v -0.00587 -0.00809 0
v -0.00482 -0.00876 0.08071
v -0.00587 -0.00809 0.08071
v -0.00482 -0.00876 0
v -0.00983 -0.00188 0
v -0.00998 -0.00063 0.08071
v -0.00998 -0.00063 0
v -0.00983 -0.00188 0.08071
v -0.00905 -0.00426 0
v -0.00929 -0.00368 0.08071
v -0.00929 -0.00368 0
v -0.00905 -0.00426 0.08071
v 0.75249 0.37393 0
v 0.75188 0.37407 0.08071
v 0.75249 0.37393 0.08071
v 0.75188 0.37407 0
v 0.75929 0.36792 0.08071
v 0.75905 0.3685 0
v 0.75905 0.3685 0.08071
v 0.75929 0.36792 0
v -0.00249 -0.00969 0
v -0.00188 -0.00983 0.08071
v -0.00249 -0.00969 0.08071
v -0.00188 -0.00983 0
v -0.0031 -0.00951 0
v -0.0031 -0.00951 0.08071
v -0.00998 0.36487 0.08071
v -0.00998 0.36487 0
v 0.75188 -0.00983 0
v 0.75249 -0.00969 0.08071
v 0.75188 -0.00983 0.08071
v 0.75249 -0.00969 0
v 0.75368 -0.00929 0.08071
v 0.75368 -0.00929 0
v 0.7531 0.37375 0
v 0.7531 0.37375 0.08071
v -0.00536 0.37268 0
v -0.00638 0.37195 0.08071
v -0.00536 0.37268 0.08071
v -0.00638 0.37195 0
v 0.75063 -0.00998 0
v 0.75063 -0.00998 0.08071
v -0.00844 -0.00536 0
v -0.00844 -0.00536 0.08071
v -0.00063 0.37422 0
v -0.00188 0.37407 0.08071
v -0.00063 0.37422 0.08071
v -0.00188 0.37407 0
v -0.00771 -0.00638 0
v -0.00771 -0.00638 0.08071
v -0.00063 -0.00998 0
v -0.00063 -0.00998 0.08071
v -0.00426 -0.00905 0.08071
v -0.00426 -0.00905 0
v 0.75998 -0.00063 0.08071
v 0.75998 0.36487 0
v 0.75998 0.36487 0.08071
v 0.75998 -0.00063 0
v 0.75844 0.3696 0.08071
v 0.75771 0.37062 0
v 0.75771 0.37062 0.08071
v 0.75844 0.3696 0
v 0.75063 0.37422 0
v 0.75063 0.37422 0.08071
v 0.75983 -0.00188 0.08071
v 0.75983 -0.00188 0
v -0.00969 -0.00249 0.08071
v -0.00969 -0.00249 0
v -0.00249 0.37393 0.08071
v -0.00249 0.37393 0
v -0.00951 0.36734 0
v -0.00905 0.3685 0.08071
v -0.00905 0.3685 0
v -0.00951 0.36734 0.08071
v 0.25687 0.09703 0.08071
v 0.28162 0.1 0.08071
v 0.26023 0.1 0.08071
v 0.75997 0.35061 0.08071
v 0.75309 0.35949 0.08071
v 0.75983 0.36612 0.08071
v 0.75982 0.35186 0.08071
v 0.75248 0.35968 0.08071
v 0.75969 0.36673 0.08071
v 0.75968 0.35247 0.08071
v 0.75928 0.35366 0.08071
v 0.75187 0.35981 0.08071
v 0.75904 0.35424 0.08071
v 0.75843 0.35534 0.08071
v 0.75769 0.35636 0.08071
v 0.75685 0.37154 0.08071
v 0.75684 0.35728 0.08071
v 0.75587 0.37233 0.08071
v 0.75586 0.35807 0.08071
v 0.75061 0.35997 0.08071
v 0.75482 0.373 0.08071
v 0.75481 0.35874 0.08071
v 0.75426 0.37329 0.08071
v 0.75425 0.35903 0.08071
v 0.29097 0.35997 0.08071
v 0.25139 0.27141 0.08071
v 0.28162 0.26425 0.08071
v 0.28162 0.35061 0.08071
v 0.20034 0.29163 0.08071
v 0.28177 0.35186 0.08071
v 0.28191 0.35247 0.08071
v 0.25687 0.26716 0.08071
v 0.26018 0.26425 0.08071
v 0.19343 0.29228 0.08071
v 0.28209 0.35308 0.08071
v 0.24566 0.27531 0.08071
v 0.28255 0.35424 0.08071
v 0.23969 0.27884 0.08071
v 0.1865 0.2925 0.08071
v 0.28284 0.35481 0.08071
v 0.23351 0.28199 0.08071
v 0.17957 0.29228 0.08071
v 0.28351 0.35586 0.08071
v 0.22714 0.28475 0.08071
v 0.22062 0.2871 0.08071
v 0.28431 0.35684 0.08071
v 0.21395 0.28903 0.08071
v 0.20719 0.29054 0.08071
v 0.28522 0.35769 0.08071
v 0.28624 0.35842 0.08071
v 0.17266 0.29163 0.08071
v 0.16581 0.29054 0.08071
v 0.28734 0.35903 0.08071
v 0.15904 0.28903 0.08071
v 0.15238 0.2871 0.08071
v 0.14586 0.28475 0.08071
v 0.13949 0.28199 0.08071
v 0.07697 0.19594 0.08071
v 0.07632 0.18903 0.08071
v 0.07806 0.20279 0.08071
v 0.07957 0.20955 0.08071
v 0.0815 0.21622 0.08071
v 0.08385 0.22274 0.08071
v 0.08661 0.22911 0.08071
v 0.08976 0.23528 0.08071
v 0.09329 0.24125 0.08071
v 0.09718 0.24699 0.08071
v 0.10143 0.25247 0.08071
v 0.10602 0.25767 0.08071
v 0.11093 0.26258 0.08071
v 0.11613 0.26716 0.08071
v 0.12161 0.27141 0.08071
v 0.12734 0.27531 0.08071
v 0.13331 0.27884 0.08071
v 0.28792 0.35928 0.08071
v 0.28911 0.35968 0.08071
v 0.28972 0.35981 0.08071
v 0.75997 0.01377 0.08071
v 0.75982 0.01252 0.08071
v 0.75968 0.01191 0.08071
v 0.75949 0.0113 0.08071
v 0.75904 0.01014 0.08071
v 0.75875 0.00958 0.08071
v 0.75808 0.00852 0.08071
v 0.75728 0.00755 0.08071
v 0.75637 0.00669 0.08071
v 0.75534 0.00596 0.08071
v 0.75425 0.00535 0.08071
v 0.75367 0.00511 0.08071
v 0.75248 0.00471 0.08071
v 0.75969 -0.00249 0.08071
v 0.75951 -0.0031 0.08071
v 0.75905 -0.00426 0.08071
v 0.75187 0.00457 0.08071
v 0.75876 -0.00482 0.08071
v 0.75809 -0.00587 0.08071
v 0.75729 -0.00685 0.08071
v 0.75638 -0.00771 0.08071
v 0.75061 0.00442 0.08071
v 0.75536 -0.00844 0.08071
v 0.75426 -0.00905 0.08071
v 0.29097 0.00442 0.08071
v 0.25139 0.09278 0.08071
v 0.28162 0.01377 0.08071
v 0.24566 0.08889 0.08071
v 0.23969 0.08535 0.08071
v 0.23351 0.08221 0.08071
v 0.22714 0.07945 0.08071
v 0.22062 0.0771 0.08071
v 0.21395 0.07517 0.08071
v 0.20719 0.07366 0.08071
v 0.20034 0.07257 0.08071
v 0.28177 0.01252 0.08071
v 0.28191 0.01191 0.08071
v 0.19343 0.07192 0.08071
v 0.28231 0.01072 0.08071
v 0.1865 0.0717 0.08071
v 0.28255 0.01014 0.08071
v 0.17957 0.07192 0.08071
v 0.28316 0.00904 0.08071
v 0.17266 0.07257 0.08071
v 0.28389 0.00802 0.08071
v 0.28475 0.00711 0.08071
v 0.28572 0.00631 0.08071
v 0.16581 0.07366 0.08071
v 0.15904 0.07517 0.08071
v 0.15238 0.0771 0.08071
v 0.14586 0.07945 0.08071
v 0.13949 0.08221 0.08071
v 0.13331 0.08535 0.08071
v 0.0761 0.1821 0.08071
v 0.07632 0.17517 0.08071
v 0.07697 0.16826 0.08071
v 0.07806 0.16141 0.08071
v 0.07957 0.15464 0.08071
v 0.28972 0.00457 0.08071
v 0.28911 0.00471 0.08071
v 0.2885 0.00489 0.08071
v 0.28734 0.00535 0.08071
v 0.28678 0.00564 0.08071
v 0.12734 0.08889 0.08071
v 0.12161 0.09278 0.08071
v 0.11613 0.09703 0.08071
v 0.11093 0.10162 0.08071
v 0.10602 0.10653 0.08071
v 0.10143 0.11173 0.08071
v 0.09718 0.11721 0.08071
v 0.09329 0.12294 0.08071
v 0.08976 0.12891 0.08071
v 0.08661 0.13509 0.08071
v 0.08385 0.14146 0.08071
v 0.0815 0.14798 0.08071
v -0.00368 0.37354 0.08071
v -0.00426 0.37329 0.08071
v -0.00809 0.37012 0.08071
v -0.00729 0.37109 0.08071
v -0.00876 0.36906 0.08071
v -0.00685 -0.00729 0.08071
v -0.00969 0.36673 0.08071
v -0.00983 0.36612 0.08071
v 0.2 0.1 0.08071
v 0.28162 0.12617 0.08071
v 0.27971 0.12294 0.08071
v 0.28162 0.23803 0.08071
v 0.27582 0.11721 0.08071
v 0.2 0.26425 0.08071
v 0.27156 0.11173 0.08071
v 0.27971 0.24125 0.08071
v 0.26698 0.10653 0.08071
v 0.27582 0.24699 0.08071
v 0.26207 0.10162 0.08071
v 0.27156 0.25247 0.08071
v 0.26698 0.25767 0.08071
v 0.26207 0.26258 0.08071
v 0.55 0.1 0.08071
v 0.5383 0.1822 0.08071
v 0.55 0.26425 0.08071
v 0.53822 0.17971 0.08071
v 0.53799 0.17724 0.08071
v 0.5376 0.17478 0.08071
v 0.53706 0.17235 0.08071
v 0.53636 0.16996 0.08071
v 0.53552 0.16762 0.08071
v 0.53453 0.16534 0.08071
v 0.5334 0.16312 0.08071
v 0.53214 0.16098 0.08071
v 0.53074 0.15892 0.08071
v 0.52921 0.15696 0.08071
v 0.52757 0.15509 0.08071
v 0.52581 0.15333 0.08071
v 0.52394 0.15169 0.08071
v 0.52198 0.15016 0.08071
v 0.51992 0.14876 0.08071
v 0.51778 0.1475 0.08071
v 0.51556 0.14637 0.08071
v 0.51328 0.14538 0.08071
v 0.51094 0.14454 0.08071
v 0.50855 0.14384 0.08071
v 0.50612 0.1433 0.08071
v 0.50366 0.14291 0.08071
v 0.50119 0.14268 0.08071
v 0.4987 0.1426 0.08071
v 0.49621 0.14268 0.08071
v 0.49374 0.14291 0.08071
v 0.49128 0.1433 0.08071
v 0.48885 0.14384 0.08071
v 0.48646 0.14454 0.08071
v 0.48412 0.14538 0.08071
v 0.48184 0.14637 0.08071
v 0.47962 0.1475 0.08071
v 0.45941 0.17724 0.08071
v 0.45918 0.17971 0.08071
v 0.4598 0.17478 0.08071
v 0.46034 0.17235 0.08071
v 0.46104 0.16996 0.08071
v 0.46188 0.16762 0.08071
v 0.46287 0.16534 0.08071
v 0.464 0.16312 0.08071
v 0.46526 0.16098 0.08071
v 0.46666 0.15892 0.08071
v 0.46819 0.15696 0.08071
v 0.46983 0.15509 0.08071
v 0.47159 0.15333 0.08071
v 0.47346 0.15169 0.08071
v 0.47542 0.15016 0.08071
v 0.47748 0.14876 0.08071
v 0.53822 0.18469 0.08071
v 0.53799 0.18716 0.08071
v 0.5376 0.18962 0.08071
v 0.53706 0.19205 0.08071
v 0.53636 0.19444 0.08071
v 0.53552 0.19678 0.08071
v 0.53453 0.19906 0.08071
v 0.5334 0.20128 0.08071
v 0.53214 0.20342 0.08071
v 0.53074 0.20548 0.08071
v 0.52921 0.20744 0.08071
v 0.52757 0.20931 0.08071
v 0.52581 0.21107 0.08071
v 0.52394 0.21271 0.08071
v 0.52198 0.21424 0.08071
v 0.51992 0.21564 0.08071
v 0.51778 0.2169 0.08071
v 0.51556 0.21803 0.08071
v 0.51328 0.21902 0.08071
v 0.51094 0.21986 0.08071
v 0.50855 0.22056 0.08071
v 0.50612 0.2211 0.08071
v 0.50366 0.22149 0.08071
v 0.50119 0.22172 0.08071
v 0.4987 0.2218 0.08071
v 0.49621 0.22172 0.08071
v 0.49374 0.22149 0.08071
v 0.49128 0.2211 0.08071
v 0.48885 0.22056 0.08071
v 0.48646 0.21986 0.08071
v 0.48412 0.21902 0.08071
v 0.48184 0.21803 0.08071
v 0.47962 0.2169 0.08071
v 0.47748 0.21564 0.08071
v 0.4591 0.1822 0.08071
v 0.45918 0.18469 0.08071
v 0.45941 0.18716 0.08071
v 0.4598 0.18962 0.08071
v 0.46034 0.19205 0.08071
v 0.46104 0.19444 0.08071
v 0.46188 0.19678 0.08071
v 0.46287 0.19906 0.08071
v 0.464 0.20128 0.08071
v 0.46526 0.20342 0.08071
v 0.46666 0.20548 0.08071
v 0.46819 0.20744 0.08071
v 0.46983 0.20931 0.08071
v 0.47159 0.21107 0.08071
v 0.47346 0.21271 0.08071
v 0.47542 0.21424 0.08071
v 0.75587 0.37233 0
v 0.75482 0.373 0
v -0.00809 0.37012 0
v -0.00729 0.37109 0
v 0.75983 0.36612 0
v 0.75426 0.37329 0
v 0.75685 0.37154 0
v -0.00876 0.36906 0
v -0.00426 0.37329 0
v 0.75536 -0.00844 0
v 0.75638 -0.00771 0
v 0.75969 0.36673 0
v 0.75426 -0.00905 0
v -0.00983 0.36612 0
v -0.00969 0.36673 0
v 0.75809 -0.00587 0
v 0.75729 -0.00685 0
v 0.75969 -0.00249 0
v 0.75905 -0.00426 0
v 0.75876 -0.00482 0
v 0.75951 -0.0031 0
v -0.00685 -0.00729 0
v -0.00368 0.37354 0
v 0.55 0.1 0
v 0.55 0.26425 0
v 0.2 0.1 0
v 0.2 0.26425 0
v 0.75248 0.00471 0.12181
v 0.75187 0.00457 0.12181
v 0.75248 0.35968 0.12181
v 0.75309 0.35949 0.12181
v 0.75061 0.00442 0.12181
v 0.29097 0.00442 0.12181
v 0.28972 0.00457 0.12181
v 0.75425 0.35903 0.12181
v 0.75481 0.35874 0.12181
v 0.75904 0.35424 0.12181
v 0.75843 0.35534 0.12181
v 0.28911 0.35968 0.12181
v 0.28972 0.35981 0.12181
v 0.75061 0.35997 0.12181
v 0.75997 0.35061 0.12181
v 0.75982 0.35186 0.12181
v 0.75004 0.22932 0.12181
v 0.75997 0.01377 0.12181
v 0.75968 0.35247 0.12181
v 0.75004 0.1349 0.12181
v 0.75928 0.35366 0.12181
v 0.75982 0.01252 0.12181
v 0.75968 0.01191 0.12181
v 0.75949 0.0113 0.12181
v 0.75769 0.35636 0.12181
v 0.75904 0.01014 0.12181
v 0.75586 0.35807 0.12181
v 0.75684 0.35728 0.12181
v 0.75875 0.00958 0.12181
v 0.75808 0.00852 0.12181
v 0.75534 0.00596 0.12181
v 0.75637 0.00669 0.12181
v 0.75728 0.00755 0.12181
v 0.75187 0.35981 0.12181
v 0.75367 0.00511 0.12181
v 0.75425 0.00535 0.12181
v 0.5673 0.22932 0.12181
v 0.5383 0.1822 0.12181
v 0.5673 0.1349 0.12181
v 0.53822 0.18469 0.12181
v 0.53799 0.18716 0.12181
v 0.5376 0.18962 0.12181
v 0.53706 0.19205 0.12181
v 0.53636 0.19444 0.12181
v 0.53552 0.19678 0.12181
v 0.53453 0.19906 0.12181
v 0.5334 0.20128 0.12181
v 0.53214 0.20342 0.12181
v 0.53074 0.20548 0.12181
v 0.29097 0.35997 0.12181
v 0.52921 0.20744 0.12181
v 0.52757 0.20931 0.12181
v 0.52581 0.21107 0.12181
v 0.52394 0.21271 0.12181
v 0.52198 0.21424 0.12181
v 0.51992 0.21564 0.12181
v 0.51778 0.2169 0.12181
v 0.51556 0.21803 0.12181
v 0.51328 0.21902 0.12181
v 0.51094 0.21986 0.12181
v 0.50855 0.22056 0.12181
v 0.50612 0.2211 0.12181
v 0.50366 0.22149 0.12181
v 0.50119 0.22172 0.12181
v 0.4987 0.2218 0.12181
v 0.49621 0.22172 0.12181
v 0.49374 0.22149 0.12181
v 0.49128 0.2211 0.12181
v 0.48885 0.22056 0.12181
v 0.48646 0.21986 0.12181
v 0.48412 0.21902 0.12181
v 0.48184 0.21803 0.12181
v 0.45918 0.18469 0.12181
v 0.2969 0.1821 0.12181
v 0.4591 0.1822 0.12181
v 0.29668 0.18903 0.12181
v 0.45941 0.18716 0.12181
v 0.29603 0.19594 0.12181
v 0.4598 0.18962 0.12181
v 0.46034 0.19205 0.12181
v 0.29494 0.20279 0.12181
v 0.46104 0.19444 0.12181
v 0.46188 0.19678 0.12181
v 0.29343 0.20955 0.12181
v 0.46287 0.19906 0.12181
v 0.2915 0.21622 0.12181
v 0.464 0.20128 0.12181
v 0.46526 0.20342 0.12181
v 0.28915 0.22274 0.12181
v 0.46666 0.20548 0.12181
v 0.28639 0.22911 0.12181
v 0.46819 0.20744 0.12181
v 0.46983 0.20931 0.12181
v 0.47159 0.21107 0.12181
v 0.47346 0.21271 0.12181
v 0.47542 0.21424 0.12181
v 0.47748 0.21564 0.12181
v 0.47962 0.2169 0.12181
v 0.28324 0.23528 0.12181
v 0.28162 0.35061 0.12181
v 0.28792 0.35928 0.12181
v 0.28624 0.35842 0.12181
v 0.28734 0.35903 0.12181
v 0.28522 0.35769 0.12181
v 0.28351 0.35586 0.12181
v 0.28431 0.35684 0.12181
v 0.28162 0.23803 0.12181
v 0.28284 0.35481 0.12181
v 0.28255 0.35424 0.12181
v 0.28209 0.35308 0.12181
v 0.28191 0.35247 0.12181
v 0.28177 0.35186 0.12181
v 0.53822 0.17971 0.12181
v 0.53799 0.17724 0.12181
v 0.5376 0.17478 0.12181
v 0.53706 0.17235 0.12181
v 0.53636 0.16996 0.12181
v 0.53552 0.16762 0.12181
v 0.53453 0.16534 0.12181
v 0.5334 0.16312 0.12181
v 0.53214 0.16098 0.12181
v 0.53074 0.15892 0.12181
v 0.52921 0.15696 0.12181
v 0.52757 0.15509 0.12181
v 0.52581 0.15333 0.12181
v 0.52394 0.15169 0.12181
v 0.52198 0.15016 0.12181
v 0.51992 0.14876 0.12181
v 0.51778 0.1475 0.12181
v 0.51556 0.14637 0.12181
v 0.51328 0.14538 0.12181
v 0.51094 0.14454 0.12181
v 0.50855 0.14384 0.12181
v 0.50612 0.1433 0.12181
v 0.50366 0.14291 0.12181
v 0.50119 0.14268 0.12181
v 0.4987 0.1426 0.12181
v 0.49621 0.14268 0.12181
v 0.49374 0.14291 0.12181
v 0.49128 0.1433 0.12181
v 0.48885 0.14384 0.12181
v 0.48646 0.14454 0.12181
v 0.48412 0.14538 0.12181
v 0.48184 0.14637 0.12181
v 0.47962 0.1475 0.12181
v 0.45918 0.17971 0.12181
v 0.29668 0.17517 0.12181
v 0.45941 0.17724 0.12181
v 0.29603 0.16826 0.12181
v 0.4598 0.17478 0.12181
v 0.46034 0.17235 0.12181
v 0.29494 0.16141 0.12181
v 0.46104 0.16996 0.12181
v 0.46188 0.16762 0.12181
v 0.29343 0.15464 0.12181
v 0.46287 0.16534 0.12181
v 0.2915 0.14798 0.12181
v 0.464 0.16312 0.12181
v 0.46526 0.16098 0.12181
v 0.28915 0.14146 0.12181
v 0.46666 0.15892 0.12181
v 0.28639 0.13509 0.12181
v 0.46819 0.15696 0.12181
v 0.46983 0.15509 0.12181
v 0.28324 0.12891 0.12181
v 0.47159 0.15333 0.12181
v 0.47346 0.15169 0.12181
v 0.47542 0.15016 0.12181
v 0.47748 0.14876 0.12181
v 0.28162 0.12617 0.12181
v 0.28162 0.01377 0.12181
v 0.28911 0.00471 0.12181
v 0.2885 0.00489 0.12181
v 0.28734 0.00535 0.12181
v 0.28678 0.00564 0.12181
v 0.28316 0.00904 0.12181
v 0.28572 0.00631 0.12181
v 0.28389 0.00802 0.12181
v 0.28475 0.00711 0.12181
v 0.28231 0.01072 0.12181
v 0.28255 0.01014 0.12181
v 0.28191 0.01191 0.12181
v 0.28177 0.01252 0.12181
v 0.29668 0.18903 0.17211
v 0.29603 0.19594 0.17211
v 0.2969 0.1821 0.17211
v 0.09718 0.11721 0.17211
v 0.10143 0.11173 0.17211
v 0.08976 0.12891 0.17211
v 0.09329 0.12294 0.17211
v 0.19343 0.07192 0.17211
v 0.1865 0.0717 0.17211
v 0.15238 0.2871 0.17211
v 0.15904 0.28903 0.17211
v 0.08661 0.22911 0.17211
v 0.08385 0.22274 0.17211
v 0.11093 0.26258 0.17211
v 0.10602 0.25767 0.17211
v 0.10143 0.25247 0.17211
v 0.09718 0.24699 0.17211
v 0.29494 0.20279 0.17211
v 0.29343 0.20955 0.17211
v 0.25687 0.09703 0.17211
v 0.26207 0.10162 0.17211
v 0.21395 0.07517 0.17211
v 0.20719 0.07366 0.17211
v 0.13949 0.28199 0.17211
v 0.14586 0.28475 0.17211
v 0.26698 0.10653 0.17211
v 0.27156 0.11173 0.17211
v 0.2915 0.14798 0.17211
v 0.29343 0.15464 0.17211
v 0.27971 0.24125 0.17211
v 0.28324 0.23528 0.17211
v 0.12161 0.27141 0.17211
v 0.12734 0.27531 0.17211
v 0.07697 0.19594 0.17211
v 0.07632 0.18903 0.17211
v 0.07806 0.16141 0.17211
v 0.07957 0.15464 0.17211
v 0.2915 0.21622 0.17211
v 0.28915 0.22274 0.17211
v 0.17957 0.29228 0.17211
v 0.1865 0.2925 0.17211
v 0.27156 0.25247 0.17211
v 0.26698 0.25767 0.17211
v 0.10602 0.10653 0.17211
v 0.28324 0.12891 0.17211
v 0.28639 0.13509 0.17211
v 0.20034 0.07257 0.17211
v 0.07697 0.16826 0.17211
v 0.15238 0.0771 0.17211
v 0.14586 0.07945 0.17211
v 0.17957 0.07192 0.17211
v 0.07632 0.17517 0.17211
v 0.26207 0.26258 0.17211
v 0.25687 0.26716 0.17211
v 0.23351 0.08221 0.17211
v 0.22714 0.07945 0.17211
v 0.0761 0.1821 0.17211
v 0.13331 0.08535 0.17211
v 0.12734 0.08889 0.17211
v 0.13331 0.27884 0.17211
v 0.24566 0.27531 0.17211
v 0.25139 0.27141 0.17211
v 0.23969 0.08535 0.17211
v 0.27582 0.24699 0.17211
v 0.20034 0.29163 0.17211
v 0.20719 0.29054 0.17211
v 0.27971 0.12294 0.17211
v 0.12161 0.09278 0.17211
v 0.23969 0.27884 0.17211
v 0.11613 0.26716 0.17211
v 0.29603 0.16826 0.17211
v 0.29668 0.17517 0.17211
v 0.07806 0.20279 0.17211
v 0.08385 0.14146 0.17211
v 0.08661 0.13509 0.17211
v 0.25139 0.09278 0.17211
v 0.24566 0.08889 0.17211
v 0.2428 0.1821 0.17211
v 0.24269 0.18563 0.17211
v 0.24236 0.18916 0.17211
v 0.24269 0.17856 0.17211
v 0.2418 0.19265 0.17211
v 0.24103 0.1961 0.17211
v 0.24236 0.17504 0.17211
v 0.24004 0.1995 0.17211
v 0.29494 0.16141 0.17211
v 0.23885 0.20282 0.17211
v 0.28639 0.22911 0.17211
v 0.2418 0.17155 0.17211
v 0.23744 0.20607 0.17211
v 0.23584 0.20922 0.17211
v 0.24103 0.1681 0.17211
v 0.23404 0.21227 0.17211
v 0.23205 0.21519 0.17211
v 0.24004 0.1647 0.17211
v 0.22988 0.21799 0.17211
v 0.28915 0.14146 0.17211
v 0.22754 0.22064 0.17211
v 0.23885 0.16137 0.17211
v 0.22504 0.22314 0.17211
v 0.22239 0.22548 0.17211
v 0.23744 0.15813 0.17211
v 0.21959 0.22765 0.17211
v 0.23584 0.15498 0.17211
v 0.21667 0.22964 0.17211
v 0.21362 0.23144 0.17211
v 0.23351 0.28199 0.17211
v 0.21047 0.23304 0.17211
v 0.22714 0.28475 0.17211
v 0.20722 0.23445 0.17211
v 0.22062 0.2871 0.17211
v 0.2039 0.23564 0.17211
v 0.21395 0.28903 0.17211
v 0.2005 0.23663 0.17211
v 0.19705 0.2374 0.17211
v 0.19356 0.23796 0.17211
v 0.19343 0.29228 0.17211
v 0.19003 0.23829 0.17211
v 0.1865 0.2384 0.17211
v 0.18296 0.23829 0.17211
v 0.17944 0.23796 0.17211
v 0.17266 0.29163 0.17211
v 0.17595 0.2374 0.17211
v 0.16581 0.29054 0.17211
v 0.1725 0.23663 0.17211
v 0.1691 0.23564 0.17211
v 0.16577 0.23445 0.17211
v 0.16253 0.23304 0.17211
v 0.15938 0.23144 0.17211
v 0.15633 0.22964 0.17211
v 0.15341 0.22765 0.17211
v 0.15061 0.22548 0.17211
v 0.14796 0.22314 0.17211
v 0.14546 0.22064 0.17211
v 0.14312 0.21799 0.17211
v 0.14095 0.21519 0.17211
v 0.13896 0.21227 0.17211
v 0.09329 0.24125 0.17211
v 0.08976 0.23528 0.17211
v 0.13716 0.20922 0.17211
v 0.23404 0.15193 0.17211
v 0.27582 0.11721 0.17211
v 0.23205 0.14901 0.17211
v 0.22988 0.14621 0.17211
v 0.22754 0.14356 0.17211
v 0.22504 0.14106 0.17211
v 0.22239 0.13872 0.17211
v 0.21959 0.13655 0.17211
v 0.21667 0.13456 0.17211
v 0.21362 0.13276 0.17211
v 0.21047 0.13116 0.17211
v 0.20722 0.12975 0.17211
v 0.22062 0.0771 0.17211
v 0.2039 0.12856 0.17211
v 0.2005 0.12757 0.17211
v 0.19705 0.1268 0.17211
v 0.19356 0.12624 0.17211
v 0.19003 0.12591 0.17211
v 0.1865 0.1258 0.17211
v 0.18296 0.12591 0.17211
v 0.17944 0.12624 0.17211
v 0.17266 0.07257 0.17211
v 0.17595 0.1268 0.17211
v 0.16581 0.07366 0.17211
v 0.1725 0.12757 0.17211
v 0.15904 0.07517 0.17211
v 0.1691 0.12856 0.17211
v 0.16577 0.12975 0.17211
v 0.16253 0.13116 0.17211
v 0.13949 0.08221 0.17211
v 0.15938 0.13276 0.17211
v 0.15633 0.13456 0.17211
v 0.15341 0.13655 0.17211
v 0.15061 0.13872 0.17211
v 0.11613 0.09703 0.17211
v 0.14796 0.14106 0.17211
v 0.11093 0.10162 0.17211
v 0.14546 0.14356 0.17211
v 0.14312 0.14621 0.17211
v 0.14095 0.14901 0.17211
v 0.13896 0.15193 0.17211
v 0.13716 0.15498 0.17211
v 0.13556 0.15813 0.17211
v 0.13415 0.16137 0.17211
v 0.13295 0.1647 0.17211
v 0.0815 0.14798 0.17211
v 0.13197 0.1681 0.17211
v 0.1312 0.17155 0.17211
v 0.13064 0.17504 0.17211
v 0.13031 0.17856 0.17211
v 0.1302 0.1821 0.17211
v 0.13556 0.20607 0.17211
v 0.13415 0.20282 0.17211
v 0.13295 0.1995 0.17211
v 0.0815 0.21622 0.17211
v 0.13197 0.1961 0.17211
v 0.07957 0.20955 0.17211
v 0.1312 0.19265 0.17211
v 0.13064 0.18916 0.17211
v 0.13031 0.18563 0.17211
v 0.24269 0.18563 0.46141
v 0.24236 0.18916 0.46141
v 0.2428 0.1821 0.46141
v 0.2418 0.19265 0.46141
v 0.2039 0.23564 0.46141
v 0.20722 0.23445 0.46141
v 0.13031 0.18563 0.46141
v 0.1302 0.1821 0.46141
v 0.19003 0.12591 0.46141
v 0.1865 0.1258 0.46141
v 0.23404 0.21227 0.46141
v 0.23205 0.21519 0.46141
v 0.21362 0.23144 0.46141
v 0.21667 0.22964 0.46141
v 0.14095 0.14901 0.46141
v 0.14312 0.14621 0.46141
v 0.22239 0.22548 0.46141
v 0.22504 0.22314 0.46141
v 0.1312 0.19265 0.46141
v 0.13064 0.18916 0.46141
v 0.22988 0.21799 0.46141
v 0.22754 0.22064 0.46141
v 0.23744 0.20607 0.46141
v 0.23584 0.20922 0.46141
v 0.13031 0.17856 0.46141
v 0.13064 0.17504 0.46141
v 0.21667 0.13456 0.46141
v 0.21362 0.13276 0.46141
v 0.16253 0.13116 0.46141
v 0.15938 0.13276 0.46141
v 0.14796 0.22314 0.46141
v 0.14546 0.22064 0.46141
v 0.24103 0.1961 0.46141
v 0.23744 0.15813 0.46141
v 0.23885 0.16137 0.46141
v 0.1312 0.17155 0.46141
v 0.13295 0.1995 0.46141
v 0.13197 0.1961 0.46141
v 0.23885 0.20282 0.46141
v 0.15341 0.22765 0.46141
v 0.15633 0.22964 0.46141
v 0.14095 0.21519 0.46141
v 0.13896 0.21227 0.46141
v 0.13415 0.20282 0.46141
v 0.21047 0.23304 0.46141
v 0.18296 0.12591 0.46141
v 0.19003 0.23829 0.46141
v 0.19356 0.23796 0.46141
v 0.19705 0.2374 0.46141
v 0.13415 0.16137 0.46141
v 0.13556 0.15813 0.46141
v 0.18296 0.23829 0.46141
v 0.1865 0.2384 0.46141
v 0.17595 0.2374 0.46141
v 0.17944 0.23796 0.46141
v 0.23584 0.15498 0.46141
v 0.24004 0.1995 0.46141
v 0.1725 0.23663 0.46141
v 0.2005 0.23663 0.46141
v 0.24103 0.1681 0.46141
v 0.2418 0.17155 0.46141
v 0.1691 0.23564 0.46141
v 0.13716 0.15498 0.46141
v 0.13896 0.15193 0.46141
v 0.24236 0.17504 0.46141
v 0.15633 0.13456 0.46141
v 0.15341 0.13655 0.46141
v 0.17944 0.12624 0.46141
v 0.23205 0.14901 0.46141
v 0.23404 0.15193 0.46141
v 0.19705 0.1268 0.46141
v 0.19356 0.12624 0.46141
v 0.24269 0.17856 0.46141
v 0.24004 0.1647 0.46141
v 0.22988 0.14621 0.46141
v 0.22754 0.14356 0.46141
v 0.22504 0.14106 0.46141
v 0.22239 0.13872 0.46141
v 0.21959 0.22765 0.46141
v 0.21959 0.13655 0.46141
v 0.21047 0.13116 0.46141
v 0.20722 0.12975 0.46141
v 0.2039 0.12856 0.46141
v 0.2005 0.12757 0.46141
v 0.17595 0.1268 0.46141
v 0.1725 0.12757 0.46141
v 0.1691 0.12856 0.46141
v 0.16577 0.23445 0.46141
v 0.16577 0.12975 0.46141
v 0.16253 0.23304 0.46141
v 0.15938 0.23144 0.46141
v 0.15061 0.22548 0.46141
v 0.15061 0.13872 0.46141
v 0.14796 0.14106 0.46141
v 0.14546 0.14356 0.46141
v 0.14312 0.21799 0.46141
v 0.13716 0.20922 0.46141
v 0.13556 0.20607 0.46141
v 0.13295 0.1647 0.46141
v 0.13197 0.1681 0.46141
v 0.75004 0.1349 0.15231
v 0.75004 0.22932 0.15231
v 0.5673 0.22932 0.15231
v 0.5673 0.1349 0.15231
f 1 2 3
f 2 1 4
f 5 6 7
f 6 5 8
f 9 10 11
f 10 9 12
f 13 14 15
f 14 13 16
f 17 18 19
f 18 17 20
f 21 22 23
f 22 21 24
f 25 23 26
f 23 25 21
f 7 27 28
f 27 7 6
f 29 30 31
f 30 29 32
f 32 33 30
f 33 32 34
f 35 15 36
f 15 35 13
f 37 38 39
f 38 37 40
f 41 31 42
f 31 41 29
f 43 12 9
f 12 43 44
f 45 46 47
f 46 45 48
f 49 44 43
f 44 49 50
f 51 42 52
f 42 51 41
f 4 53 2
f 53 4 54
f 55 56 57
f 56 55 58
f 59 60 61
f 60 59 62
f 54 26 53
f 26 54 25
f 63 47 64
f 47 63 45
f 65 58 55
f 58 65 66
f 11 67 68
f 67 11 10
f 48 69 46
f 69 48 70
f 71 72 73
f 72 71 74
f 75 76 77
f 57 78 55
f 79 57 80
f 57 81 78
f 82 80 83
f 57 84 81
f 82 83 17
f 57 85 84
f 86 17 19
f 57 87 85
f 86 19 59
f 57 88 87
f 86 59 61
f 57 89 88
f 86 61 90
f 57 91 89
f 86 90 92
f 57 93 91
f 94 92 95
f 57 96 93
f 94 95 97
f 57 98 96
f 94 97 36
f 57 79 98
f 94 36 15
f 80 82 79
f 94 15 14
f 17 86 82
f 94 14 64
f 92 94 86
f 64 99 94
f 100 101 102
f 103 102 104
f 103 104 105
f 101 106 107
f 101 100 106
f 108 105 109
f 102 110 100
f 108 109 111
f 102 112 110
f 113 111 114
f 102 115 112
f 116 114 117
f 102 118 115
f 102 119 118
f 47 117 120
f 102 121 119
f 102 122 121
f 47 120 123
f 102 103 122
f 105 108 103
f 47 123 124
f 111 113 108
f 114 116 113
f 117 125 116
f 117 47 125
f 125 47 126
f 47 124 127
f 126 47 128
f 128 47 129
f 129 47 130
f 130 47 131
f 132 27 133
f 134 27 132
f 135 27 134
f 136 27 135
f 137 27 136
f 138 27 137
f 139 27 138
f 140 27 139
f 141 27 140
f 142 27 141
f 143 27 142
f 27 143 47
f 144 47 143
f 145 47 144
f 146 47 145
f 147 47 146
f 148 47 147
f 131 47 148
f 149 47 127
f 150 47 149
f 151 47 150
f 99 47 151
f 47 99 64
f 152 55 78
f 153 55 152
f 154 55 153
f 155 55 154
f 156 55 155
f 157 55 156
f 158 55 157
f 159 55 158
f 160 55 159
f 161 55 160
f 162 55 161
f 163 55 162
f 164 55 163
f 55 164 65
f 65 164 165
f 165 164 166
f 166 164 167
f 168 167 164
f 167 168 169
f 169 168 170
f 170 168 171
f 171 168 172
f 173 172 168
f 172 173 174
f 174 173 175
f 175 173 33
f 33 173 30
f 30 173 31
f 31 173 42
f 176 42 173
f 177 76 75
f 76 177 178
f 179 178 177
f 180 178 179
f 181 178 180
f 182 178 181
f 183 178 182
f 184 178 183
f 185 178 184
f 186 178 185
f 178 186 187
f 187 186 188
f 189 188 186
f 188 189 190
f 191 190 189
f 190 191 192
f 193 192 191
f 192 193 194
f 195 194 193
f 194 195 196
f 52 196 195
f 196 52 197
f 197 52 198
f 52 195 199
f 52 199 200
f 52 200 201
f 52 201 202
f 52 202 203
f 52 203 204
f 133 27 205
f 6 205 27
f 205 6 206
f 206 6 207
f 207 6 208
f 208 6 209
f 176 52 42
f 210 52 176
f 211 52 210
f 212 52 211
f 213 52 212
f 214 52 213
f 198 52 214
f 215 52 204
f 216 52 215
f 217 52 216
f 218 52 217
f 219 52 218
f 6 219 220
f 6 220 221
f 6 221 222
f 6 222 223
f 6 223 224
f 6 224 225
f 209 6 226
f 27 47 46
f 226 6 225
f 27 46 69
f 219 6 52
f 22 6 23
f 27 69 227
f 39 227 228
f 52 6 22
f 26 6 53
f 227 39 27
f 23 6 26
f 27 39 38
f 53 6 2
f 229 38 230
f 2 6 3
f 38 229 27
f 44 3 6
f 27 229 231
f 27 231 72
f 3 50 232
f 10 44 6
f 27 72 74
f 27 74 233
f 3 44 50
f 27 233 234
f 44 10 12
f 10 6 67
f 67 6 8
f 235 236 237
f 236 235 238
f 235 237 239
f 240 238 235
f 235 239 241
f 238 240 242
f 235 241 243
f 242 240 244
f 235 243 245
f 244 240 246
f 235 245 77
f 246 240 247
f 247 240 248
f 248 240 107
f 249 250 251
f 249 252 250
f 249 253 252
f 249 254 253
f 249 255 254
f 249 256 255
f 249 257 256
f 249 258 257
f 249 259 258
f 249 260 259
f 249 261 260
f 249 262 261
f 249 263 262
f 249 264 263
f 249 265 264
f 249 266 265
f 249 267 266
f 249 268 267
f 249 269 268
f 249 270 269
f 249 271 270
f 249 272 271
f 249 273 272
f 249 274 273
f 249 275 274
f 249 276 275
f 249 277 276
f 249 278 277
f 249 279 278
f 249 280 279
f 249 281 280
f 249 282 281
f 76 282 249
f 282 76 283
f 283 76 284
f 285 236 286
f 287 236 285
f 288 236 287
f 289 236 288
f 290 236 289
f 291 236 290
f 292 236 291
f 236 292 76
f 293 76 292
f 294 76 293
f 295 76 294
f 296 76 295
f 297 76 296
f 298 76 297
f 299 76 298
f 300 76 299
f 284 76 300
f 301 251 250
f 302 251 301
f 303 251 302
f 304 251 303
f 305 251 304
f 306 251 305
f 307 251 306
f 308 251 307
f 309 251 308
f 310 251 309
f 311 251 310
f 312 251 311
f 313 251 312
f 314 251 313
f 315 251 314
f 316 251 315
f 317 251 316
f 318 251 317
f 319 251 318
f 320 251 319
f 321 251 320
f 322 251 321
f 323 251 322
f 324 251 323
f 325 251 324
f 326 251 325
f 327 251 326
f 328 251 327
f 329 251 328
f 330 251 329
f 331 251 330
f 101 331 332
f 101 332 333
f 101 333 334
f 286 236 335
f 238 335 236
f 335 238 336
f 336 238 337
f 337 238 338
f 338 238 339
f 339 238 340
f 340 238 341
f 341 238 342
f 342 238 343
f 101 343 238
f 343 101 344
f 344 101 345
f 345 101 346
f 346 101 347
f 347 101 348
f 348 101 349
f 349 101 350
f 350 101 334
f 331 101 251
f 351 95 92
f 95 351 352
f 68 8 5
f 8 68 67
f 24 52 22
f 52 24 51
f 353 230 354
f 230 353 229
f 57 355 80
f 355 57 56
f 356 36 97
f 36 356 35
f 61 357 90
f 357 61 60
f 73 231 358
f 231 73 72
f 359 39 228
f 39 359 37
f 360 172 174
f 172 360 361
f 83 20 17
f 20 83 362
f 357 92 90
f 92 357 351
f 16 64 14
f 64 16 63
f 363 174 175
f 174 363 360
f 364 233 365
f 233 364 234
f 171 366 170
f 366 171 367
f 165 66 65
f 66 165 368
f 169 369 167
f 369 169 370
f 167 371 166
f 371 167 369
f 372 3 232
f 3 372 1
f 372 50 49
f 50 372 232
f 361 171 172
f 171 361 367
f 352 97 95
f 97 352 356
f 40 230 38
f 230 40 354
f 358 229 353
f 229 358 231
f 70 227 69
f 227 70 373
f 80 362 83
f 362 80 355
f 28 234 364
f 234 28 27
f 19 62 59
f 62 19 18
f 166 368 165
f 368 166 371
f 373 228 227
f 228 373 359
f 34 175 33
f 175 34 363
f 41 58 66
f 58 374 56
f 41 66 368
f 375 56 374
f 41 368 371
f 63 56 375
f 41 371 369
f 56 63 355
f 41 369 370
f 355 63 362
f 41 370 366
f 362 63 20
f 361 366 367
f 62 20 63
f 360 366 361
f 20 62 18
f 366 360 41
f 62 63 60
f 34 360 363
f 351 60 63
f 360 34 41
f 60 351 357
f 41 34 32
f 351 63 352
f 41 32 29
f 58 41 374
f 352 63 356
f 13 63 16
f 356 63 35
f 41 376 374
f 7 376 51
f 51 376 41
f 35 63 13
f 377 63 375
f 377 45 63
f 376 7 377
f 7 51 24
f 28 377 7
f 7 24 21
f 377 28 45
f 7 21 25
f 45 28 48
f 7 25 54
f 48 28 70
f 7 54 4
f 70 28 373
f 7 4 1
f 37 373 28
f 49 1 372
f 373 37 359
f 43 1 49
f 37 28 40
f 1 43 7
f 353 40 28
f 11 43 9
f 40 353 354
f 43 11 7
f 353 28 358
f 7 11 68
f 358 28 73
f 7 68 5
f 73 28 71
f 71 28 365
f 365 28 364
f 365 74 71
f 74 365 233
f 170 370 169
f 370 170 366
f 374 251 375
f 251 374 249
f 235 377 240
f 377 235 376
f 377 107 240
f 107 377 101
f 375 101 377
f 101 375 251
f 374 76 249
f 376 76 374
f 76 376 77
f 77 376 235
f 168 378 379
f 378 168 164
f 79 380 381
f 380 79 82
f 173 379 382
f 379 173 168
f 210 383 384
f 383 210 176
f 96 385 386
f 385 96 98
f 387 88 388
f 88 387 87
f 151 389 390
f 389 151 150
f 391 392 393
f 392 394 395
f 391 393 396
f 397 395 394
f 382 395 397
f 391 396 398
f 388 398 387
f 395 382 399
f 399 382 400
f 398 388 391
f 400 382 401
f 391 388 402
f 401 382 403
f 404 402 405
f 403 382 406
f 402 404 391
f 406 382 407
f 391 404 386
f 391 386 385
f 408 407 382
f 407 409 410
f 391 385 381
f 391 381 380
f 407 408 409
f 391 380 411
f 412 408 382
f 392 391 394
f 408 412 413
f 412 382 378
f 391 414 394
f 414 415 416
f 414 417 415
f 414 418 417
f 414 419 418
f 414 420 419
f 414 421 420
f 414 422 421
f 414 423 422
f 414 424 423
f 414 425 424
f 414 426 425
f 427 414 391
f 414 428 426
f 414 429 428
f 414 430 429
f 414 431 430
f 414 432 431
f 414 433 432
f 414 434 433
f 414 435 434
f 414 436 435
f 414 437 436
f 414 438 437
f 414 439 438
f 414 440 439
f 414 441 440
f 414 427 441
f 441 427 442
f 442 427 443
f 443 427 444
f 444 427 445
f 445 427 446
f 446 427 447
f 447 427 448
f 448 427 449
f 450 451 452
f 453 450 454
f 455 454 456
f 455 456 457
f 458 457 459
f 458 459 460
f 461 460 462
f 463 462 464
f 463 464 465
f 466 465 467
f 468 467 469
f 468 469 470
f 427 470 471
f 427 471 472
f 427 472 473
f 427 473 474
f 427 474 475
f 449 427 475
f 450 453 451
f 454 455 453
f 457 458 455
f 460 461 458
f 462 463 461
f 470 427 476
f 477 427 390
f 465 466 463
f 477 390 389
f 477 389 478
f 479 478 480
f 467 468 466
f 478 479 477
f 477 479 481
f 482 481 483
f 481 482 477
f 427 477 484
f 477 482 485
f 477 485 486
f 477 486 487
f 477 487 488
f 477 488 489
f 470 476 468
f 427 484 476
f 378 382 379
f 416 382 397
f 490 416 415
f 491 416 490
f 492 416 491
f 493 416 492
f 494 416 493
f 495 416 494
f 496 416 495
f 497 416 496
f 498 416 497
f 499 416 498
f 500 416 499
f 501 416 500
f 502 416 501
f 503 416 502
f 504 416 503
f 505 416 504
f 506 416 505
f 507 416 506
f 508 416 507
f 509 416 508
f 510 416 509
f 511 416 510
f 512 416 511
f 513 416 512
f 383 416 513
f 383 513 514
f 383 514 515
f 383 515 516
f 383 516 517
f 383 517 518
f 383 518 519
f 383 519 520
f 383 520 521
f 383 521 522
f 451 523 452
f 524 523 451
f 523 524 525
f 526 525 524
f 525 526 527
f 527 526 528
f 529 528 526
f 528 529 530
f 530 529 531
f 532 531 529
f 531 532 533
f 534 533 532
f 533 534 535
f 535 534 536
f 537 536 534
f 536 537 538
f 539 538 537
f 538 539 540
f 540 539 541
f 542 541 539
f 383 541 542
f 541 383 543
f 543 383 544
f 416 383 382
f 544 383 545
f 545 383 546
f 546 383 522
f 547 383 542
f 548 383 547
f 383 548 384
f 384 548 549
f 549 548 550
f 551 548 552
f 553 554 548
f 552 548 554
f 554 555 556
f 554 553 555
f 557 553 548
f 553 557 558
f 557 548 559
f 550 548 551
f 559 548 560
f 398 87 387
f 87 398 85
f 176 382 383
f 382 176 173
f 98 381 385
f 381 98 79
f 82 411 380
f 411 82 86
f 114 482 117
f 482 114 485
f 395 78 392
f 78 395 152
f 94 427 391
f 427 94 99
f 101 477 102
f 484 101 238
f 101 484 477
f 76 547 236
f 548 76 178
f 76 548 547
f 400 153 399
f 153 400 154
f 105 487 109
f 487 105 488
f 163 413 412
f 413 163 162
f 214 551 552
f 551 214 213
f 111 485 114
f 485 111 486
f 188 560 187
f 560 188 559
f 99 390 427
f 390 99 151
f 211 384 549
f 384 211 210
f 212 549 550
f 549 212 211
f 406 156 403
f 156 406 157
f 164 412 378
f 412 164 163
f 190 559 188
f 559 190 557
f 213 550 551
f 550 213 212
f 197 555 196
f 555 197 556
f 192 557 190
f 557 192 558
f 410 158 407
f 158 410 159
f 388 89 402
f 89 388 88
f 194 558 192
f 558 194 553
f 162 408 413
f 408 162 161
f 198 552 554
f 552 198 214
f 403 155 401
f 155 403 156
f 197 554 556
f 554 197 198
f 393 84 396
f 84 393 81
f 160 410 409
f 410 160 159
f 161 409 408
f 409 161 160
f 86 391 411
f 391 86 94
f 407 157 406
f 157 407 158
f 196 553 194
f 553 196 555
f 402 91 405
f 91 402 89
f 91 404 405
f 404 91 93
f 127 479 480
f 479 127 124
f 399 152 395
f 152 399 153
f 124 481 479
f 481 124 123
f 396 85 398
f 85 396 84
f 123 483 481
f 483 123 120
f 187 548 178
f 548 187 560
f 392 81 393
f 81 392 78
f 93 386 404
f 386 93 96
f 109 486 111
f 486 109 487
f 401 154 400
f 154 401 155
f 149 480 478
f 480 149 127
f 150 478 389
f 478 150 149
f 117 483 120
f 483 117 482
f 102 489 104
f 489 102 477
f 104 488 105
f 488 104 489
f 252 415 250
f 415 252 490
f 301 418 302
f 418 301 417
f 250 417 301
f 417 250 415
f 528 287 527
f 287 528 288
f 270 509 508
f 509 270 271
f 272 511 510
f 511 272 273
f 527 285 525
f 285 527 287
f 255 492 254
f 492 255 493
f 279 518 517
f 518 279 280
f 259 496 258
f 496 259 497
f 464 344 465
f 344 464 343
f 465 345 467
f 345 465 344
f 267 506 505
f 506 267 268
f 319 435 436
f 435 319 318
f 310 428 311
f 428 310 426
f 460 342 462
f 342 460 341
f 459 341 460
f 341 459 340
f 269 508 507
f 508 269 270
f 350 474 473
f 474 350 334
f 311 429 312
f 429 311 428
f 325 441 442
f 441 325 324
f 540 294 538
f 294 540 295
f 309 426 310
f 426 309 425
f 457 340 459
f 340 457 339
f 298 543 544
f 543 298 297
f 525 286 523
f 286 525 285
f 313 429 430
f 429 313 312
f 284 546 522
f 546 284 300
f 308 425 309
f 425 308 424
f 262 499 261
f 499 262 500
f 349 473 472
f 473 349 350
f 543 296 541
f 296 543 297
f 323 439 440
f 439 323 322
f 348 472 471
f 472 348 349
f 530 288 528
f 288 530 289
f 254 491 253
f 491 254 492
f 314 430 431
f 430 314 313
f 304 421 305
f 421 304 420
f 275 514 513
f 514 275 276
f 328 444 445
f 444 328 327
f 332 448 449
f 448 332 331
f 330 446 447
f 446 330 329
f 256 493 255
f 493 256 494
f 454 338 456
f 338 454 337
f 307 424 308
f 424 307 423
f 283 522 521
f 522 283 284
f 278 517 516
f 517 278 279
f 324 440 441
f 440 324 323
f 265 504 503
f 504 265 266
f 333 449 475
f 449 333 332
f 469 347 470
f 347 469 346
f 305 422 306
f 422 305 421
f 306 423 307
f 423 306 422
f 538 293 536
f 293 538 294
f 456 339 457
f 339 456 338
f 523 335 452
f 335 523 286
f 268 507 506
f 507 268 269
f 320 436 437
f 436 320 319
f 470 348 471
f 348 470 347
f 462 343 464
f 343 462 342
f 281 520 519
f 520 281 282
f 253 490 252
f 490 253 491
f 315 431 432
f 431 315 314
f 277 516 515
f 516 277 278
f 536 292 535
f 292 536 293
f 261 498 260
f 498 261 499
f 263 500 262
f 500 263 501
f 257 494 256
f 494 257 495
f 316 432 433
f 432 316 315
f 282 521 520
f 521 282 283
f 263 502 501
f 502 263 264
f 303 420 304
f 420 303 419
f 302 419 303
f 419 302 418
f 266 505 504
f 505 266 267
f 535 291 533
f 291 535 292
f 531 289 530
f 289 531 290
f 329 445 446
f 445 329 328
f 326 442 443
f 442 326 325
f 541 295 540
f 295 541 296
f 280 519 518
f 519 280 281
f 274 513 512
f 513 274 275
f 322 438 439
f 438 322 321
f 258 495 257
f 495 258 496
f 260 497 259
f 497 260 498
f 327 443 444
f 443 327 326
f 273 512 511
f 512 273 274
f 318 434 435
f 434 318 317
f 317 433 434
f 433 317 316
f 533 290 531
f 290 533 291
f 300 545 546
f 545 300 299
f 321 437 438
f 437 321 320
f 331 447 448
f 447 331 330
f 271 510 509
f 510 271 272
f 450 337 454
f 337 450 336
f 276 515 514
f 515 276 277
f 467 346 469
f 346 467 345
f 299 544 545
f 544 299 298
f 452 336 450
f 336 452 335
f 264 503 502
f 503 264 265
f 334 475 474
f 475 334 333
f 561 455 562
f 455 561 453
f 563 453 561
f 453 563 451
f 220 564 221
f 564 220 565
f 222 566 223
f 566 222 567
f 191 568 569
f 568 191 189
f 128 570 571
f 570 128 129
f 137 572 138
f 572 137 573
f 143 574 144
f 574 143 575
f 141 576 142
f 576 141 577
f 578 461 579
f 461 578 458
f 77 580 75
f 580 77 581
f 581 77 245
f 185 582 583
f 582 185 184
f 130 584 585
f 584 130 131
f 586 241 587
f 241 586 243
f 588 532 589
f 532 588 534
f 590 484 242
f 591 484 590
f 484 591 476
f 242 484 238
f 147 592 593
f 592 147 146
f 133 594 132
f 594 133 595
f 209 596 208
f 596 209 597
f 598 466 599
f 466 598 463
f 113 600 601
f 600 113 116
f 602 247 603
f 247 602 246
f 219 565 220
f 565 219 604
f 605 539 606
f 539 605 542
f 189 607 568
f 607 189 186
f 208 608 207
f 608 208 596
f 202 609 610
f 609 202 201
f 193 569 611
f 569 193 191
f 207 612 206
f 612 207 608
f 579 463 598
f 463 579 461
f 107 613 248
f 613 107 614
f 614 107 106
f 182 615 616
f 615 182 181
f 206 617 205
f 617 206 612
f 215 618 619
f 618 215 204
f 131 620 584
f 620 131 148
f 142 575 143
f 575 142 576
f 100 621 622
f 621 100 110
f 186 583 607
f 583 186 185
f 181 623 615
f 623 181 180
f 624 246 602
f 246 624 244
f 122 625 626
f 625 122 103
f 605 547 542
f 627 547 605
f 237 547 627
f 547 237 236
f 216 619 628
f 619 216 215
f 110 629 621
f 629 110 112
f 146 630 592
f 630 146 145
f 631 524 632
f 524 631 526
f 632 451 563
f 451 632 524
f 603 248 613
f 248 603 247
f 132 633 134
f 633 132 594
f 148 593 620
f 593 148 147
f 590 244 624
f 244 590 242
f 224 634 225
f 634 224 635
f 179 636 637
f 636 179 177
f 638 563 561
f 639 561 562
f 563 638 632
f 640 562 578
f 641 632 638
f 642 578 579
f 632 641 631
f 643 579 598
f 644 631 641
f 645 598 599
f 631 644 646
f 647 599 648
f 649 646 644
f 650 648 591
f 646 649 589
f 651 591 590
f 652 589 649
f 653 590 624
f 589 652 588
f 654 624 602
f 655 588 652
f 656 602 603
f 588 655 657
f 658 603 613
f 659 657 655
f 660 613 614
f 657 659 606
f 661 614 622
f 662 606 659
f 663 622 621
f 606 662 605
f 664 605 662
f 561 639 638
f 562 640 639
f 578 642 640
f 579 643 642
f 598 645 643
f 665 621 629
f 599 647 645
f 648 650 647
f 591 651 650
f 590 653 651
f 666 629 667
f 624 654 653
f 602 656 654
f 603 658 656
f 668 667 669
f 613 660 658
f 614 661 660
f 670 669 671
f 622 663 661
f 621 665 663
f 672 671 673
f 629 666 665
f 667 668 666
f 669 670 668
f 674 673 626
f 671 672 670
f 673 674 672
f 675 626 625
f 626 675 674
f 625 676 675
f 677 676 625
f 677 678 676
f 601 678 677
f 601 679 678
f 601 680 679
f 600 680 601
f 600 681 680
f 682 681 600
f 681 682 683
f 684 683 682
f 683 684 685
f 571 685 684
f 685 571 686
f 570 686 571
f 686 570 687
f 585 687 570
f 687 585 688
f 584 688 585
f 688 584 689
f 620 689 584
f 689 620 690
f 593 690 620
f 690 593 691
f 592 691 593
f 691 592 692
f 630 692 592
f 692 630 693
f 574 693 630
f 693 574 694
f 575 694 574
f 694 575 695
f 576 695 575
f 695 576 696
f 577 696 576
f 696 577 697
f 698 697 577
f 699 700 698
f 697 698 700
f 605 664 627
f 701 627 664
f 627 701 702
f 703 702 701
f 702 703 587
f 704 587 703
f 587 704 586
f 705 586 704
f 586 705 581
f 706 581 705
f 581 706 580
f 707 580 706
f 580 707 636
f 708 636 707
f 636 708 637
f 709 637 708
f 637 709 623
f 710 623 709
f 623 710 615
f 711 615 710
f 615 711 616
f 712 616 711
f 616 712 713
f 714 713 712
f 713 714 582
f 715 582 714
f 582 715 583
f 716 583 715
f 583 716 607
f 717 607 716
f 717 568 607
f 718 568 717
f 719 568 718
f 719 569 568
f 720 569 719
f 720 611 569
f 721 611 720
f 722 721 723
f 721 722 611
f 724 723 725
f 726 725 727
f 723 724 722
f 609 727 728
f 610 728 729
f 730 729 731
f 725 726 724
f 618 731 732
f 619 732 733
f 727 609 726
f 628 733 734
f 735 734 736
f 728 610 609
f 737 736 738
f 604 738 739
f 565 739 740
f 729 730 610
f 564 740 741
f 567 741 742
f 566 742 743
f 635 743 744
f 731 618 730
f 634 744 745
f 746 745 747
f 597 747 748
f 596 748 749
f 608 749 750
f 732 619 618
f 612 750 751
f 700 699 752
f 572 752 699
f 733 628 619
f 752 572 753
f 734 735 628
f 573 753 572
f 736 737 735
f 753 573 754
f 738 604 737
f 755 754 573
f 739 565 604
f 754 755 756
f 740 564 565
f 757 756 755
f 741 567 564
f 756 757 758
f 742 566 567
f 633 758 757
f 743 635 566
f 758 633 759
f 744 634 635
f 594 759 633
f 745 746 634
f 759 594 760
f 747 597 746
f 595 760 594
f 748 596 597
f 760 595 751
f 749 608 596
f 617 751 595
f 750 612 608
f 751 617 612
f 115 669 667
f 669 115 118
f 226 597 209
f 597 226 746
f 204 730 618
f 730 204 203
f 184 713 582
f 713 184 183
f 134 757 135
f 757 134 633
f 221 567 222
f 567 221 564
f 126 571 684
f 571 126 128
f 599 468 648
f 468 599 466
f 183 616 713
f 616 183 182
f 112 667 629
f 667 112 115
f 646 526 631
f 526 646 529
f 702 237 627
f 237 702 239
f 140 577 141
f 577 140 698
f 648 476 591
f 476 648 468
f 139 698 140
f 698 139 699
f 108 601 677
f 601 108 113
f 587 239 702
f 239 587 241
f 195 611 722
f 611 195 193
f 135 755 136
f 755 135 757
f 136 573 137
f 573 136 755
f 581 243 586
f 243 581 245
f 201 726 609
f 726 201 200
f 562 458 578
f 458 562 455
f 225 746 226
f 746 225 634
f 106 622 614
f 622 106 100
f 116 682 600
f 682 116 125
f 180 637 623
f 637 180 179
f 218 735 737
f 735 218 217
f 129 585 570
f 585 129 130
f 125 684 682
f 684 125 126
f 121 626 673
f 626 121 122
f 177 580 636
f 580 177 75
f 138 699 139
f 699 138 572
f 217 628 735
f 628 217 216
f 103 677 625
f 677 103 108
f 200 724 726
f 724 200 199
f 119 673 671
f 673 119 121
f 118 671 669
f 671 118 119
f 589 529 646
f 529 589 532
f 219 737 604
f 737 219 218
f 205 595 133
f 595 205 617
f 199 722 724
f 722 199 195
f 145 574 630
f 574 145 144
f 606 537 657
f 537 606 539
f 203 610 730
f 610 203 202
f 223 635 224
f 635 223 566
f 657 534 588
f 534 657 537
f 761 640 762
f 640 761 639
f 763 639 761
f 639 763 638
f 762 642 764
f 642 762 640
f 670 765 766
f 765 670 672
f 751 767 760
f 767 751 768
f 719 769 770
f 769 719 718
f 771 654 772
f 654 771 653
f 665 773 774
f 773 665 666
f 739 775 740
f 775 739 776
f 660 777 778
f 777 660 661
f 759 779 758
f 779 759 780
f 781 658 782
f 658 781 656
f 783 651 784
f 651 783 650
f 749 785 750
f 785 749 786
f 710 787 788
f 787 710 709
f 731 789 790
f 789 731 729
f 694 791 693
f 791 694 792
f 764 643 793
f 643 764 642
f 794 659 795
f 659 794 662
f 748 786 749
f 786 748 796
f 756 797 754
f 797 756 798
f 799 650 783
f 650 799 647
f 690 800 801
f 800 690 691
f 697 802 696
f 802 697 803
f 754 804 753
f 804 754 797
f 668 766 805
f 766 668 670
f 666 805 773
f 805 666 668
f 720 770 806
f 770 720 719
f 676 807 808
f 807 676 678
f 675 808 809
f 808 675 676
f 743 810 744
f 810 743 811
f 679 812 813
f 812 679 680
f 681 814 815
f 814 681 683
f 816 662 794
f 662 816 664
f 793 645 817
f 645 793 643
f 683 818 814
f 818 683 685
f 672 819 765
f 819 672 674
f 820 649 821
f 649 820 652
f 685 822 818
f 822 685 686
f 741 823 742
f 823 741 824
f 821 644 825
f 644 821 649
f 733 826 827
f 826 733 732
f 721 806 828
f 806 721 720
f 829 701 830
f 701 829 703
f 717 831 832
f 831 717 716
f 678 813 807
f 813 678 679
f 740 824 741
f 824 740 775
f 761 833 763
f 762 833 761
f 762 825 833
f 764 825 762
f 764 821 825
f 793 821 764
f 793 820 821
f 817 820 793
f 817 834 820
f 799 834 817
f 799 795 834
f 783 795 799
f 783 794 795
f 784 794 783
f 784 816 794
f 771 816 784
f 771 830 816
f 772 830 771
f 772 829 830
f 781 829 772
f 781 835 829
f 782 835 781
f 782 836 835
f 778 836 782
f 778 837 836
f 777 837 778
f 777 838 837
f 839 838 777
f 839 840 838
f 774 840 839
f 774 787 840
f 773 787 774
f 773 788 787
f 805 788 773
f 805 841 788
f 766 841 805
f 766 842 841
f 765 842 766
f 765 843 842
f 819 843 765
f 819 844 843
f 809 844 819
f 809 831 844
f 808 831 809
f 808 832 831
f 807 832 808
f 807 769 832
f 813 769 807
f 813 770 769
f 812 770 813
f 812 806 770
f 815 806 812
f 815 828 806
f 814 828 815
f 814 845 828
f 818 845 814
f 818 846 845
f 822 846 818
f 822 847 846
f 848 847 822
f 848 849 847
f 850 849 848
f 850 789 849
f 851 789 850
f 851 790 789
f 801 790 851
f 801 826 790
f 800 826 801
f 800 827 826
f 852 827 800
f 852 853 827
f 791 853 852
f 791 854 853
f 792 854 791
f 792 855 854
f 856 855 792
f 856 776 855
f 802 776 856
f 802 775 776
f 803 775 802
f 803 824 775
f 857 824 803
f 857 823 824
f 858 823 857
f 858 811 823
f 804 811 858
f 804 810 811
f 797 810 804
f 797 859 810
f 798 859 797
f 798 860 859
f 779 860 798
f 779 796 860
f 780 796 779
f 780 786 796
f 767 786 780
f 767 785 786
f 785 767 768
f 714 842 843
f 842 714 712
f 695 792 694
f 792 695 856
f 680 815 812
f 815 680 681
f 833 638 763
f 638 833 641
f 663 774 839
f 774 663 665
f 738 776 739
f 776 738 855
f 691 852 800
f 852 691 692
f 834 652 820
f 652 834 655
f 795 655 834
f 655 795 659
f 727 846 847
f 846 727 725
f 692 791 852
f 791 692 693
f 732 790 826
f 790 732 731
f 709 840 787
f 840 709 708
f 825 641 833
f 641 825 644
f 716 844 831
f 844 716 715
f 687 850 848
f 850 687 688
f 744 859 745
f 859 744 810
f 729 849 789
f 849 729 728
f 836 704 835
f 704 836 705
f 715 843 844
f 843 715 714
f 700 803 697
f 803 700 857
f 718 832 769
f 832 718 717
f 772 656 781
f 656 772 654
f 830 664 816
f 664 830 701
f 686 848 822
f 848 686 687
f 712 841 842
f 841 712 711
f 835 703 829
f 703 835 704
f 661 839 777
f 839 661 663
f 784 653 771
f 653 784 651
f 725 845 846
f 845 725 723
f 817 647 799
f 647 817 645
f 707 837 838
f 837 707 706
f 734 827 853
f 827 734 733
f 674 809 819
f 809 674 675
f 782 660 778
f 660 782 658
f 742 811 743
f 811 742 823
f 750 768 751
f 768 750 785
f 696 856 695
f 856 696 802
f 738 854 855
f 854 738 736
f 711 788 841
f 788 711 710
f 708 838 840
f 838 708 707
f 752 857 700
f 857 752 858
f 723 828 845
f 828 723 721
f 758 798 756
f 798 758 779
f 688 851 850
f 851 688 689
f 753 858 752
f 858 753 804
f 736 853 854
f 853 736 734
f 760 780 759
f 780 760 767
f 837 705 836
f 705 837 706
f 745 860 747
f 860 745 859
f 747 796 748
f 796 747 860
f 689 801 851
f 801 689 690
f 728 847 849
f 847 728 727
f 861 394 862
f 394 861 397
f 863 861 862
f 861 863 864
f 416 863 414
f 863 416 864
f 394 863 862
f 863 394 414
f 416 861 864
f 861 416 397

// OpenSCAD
// Parameters
base_length = 0.75;
base_width = 0.364251;
base_height = 0.080711;
extrusion_depth = 0.0807;

// Circular through opening in base
base_hole_x = 0.4987;
base_hole_y = 0.1821;
base_hole_radius = 0.0396;

// Lower collar
collar_radius = 0.1104;
collar_x = 0.1865;
collar_y = 0.1821;
collar_footprint = 0.220812;
collar_footprint_x = 0.0761;
collar_footprint_y = 0.0717;
collar_height = 0.0914;

// Upper post
post_radius = 0.0563;
post_footprint = 0.1126;
post_footprint_x = 0.1302;
post_footprint_y = 0.1258;
post_height = 0.2893;

// Raised rounded region
rounded_region_x = 0.2916;
rounded_region_y = 0.0144;
rounded_region_width = 0.4584;
rounded_region_height = 0.3356;
rounded_region_thickness = 0.0411;

// Circular profile in raised region
raised_circle_x = 0.4987;
raised_circle_y = 0.1822;
raised_circle_radius = 0.0396;

// Rectangular rib
rib_x = 0.5673;
rib_y = 0.1349;
rib_width = 0.182741;
rib_height = 0.094416;
rib_thickness = 0.0305;

$fn = 100; // Smooth curves

// Main base with rounded corners and slot
module base() {
    difference() {
        // Main base body with rounded corners
        linear_extrude(height = base_height)
            offset(r = 0.01) // Small rounding radius
                square([base_length, base_width], center = false);
        
        // Through slot (example dimensions - adjust as needed)
        translate([0.2, 0.1, -0.01])
            cube([0.35, 0.164251, base_height + 0.02]);
        
        // Circular through opening
        translate([base_hole_x, base_hole_y, -0.01])
            cylinder(h = base_height + 0.02, r = base_hole_radius);
    }
}

// Lower collar
module lower_collar() {
    translate([collar_x, collar_y, base_height])
        cylinder(h = collar_height, r = collar_radius);
}

// Upper post
module upper_post() {
    translate([collar_x, collar_y, base_height + collar_height])
        cylinder(h = post_height, r = post_radius);
}

// Raised rounded region
module raised_region() {
    difference() {
        translate([rounded_region_x, rounded_region_y, base_height])
            linear_extrude(height = rounded_region_thickness)
                offset(r = 0.01)
                    square([rounded_region_width, rounded_region_height], center = false);
        
        // Circular profile in raised region
        translate([raised_circle_x, raised_circle_y, base_height - 0.01])
            cylinder(h = rounded_region_thickness + 0.02, r = raised_circle_radius);
    }
}

// Rectangular rib
module rectangular_rib() {
    translate([rib_x, rib_y, base_height + rounded_region_thickness])
        cube([rib_width, rib_height, rib_thickness]);
}

// Final assembly
union() {
    base();
    lower_collar();
    upper_post();
    raised_region();
    rectangular_rib();
}
